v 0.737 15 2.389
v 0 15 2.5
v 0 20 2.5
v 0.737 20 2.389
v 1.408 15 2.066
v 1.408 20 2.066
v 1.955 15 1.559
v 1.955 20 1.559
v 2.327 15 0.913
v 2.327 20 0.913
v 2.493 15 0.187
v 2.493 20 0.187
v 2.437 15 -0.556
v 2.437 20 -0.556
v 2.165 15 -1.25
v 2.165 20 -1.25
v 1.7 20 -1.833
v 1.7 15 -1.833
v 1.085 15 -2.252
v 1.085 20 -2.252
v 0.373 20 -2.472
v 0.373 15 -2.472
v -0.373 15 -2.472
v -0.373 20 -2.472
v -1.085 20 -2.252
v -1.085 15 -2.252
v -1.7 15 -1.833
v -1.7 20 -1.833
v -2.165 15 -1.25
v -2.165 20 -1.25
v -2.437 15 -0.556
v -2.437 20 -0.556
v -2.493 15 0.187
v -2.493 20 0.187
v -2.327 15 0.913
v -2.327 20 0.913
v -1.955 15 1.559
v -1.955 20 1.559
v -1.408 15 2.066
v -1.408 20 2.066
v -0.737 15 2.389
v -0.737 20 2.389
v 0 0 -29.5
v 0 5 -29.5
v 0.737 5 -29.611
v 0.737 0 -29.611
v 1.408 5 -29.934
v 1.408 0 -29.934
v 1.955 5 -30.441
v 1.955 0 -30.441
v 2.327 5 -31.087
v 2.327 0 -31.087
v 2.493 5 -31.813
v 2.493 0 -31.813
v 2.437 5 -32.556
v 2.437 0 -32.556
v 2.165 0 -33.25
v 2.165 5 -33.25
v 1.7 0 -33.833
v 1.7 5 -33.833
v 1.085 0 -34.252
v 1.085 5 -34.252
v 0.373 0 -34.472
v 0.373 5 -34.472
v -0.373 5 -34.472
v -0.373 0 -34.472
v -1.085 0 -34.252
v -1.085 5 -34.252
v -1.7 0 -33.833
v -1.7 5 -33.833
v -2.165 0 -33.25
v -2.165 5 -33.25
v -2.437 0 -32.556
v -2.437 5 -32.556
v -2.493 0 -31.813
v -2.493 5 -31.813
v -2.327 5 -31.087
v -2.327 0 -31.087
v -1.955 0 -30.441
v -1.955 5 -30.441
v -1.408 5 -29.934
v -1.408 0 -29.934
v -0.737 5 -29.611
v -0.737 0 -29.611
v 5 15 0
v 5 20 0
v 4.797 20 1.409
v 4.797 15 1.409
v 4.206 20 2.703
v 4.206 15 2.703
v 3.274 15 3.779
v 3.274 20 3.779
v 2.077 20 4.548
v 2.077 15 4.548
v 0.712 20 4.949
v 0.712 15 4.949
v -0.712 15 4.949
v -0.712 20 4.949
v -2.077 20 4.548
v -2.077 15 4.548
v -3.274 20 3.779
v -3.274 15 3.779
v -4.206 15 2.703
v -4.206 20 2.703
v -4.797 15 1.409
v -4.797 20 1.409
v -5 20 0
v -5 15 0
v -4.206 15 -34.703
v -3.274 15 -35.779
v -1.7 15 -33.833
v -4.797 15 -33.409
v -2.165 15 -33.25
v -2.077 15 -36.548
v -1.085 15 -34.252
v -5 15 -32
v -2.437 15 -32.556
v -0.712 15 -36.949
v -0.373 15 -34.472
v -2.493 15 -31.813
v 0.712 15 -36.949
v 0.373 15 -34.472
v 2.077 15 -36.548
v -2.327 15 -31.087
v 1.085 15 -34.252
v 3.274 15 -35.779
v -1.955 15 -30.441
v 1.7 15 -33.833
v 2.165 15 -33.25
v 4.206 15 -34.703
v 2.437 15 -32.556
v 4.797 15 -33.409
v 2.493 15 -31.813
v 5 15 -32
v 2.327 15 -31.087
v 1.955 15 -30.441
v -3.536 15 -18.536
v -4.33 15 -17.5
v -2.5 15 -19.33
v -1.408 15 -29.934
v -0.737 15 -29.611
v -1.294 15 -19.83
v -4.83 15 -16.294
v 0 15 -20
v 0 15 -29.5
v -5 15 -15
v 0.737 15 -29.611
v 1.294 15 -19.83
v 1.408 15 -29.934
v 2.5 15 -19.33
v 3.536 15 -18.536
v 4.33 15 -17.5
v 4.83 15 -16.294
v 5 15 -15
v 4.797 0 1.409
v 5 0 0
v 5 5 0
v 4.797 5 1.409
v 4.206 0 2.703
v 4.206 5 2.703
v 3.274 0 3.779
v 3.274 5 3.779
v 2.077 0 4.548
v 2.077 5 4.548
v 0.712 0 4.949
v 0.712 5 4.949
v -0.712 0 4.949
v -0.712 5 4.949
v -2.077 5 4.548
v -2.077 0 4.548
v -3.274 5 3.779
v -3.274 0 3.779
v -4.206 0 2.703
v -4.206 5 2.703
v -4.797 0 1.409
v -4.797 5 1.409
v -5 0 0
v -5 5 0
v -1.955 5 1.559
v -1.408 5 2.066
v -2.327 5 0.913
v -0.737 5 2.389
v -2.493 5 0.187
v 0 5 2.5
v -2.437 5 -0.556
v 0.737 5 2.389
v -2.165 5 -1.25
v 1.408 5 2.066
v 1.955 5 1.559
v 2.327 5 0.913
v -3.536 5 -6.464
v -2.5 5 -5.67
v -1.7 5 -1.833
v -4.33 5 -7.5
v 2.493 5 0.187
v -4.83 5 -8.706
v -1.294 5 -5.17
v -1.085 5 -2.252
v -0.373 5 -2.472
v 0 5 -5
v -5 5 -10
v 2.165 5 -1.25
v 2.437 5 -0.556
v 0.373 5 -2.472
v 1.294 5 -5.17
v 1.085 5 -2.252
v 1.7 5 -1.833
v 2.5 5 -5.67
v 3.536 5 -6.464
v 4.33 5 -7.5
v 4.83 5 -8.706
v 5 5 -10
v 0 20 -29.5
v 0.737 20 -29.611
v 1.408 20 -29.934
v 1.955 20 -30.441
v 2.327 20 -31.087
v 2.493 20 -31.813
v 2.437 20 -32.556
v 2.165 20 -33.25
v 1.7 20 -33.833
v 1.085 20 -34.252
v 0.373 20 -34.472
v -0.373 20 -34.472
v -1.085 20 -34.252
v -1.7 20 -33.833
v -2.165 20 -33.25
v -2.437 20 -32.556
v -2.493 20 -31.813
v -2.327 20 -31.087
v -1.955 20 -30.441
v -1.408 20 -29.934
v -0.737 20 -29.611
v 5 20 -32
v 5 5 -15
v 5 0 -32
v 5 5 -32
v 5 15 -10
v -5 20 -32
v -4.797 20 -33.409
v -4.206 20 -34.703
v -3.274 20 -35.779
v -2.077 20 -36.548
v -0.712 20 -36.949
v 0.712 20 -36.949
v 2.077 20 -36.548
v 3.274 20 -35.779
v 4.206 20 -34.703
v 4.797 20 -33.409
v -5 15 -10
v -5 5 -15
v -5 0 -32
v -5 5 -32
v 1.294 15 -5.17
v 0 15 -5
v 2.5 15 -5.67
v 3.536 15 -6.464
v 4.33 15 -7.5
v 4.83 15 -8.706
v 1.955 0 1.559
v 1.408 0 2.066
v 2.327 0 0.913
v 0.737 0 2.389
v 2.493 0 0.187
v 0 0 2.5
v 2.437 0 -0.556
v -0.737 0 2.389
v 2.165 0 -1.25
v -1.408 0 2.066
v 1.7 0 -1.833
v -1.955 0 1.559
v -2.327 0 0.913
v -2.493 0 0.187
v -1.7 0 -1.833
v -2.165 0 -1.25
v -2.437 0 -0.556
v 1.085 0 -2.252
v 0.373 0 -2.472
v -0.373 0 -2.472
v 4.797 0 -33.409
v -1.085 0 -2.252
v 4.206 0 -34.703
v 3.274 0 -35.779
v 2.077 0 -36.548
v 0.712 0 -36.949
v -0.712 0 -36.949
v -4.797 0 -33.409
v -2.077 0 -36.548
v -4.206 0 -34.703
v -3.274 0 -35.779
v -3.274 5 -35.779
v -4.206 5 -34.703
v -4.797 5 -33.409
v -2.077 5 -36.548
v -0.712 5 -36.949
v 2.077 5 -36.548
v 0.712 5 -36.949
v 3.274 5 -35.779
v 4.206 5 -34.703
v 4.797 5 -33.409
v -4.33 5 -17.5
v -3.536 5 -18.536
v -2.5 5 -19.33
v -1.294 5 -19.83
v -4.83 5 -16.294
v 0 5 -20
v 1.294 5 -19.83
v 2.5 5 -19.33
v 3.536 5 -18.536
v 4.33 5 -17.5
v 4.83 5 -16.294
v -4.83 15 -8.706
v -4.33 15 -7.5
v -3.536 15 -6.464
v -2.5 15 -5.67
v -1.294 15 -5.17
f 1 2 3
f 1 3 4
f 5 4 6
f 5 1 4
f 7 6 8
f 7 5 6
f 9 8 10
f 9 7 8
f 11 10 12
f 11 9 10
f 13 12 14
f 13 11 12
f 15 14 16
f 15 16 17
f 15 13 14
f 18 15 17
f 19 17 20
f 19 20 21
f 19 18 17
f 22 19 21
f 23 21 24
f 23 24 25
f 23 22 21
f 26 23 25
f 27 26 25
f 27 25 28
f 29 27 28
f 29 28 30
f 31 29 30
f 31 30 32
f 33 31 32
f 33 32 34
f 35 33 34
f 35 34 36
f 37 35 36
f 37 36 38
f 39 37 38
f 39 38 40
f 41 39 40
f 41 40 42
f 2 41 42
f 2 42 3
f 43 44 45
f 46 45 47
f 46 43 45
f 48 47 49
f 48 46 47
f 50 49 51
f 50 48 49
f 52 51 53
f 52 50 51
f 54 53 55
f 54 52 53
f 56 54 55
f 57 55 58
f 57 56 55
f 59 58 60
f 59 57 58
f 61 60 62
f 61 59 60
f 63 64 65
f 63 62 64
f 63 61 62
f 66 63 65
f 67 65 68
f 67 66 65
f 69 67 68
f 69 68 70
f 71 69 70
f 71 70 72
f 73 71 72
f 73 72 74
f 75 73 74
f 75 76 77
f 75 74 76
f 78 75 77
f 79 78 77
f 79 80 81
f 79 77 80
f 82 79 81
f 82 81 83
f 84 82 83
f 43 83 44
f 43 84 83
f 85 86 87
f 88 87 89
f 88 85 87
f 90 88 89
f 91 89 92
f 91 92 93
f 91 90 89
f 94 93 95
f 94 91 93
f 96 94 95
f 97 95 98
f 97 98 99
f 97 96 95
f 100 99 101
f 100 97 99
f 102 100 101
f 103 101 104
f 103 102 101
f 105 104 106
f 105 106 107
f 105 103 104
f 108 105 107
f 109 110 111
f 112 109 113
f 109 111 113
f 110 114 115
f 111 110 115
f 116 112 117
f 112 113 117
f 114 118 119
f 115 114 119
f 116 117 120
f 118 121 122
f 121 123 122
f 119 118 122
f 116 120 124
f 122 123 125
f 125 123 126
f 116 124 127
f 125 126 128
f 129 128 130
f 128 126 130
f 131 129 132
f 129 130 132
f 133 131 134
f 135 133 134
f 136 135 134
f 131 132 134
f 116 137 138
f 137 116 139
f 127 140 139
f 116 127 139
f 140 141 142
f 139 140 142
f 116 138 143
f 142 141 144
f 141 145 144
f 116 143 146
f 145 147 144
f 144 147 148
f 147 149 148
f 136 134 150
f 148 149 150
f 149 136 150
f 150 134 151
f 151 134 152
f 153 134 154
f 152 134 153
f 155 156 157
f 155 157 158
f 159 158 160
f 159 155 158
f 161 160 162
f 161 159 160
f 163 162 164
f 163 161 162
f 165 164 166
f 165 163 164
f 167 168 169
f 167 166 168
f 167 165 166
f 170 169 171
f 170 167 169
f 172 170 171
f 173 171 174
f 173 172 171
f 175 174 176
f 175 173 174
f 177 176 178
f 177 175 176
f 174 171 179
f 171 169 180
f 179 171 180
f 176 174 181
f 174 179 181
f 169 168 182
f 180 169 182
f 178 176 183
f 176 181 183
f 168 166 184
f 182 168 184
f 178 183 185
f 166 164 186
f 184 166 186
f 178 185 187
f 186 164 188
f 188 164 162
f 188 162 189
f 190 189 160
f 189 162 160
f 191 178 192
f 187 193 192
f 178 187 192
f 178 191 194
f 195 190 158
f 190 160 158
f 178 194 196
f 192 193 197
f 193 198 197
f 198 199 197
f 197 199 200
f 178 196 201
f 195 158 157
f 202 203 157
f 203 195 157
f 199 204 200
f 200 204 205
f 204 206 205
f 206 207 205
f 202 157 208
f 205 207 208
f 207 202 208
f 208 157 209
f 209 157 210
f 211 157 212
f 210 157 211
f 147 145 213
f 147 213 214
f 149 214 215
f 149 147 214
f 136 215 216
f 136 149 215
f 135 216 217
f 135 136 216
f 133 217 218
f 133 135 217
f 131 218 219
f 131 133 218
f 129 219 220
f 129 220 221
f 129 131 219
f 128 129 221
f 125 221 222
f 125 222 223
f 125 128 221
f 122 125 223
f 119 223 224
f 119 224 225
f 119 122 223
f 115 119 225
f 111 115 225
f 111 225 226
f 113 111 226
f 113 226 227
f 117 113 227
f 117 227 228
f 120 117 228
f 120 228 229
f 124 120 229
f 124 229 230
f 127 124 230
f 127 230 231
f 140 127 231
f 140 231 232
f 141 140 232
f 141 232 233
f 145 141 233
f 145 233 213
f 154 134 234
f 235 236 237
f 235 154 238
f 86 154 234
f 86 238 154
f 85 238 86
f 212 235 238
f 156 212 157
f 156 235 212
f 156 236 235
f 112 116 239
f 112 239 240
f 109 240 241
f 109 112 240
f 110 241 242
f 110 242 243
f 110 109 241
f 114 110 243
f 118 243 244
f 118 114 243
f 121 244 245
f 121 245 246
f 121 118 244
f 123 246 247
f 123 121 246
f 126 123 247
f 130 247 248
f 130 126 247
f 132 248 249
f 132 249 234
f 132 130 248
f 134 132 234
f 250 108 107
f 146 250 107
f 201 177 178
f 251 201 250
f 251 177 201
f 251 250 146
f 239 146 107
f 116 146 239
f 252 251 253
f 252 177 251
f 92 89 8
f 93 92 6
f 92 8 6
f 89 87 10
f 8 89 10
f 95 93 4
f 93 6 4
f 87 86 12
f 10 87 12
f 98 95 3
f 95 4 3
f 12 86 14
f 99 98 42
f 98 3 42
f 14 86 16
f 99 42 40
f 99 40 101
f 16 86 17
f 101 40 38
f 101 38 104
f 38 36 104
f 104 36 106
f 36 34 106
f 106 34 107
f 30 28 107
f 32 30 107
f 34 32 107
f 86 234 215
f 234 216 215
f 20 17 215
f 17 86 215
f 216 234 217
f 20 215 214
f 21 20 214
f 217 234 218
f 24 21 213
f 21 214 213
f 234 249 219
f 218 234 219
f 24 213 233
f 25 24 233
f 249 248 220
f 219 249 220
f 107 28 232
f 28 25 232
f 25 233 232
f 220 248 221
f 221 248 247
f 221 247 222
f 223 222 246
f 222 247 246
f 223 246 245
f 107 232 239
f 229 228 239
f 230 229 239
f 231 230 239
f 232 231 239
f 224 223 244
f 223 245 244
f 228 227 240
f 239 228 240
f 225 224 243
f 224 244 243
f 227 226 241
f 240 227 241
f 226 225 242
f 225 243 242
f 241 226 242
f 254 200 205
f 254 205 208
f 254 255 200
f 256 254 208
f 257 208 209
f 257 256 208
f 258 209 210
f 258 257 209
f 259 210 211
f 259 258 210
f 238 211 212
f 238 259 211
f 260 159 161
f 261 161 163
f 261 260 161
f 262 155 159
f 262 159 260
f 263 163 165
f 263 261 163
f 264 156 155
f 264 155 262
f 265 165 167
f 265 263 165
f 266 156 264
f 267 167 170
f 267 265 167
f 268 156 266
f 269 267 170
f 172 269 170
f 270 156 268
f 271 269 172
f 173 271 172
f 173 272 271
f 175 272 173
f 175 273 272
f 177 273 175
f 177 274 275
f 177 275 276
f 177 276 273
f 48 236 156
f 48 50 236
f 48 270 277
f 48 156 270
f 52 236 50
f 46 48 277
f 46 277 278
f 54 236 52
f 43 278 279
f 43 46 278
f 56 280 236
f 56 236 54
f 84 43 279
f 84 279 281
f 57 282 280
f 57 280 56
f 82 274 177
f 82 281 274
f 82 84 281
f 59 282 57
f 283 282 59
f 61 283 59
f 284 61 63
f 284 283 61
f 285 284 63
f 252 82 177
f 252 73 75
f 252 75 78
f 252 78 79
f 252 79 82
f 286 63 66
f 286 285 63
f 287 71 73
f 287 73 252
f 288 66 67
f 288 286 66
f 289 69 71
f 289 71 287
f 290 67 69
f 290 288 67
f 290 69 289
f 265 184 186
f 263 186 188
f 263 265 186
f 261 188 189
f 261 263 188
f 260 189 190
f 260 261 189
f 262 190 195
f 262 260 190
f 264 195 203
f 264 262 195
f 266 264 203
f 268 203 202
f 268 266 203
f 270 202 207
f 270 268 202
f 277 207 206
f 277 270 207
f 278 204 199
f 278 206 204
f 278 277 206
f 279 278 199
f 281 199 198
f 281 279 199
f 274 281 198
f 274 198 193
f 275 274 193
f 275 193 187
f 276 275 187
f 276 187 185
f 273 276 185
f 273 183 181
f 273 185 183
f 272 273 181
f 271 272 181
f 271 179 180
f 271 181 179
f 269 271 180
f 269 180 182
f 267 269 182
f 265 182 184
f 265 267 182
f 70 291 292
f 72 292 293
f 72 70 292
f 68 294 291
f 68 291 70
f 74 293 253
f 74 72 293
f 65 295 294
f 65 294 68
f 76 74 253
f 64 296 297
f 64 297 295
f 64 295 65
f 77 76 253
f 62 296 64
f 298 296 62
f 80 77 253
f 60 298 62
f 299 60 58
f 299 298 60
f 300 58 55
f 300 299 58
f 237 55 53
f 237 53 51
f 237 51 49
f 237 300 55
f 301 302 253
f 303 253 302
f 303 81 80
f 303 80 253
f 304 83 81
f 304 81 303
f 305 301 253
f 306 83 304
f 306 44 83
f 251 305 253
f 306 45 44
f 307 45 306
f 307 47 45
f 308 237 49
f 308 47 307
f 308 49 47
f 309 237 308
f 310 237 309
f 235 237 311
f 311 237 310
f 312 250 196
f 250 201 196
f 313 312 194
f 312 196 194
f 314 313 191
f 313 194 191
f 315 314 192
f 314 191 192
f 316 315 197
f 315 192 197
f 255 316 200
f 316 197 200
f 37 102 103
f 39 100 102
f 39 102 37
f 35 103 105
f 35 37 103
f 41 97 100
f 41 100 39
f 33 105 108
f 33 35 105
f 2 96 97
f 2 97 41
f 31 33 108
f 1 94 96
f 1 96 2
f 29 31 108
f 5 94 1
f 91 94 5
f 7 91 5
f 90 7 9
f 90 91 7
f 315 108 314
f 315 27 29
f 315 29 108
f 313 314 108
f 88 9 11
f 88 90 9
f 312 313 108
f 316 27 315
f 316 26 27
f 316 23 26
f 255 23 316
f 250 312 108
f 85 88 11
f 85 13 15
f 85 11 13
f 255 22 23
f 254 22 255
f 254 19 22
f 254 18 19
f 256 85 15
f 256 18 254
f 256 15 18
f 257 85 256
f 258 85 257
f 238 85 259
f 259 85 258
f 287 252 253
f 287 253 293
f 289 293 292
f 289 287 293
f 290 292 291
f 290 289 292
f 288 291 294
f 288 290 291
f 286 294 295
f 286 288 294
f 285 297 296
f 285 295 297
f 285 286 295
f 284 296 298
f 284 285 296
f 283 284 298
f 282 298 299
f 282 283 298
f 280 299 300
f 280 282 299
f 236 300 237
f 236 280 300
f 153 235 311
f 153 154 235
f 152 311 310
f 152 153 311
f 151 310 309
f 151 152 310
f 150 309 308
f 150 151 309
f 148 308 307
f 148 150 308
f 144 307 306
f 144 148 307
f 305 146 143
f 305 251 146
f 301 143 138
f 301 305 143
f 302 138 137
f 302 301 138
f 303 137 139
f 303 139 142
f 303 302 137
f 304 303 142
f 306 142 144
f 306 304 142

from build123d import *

# Parameters (mm, degrees)
SKETCH1_R           = 2.5
BOSS_EXTRUDE1_DEPTH = 20
SKETCH2_W           = 10
SKETCH2_H           = 10
CUT_EXTRUDE1_DEPTH  = 15
FILLET1_R           = 5
SKETCH3_W           = 25
SKETCH3_H           = 10
CUT_EXTRUDE3_DEPTH  = 10
FILLET3_R           = 5


with BuildPart() as part:
    # Sketch1 → Boss-Extrude1 (new body)
    with BuildSketch(Plane(origin=(0, 0, 0), x_dir=(1, 0, 0), z_dir=(0, 1, 0))):
        with BuildLine():
            Line((-5, 0), (-5, 32))
            ThreePointArc((-5, 32), (0, 37), (5, 32))
            Line((5, 32), (5, 0))
            ThreePointArc((5, 0), (0, -5), (-5, 0))
        make_face()
        with Locations(Location((0, 32, 0), (0, 0, 270))):
            Circle(SKETCH1_R, mode=Mode.SUBTRACT)
        with Locations(Location((0, 0, 0), (0, 0, 270))):
            Circle(SKETCH1_R, mode=Mode.SUBTRACT)
    extrude(amount=BOSS_EXTRUDE1_DEPTH)

    # Sketch2 → Cut-Extrude1 (cut)
    with BuildSketch(Plane(origin=(5, 0, 0), x_dir=(0, 0, -1), z_dir=(1, 0, 0))):
        with Locations((0, 10)):
            Rectangle(SKETCH2_W, SKETCH2_H)
    cut_extrude1 = extrude(amount=-CUT_EXTRUDE1_DEPTH, mode=Mode.SUBTRACT)

    # Mirror1: Cut-Extrude1 across plane
    add(cut_extrude1.mirror(Plane.XY.offset(-15)), mode=Mode.SUBTRACT)

    # Fillet1
    fillet1_edges = [part.edges().sort_by_distance(p)[0] for p in [
        (-5, 10, -25),
        (5, 10, -25),
        (-5, 10, -5),
        (5, 10, -5),
    ]]
    fillet(fillet1_edges, radius=FILLET1_R - 0.0001)  # a hair under: the kernel refuses the full size

    # Sketch3 → Cut-Extrude3 (cut)
    with BuildSketch(Plane(origin=(5, 0, 0), x_dir=(0, 0, -1), z_dir=(1, 0, 0))):
        with Locations((32.5, 10)):
            Rectangle(SKETCH3_W, SKETCH3_H)
    extrude(amount=-CUT_EXTRUDE3_DEPTH, mode=Mode.SUBTRACT)

    # Fillet3
    fillet3_edges = [part.edges().sort_by_distance(p)[0] for p in [
        (-5, 10, -20.0001),
        (5, 10, -20.0001),
    ]]
    fillet(fillet3_edges, radius=FILLET3_R - 0.0001)  # a hair under: the kernel refuses the full size


solid = part.part
